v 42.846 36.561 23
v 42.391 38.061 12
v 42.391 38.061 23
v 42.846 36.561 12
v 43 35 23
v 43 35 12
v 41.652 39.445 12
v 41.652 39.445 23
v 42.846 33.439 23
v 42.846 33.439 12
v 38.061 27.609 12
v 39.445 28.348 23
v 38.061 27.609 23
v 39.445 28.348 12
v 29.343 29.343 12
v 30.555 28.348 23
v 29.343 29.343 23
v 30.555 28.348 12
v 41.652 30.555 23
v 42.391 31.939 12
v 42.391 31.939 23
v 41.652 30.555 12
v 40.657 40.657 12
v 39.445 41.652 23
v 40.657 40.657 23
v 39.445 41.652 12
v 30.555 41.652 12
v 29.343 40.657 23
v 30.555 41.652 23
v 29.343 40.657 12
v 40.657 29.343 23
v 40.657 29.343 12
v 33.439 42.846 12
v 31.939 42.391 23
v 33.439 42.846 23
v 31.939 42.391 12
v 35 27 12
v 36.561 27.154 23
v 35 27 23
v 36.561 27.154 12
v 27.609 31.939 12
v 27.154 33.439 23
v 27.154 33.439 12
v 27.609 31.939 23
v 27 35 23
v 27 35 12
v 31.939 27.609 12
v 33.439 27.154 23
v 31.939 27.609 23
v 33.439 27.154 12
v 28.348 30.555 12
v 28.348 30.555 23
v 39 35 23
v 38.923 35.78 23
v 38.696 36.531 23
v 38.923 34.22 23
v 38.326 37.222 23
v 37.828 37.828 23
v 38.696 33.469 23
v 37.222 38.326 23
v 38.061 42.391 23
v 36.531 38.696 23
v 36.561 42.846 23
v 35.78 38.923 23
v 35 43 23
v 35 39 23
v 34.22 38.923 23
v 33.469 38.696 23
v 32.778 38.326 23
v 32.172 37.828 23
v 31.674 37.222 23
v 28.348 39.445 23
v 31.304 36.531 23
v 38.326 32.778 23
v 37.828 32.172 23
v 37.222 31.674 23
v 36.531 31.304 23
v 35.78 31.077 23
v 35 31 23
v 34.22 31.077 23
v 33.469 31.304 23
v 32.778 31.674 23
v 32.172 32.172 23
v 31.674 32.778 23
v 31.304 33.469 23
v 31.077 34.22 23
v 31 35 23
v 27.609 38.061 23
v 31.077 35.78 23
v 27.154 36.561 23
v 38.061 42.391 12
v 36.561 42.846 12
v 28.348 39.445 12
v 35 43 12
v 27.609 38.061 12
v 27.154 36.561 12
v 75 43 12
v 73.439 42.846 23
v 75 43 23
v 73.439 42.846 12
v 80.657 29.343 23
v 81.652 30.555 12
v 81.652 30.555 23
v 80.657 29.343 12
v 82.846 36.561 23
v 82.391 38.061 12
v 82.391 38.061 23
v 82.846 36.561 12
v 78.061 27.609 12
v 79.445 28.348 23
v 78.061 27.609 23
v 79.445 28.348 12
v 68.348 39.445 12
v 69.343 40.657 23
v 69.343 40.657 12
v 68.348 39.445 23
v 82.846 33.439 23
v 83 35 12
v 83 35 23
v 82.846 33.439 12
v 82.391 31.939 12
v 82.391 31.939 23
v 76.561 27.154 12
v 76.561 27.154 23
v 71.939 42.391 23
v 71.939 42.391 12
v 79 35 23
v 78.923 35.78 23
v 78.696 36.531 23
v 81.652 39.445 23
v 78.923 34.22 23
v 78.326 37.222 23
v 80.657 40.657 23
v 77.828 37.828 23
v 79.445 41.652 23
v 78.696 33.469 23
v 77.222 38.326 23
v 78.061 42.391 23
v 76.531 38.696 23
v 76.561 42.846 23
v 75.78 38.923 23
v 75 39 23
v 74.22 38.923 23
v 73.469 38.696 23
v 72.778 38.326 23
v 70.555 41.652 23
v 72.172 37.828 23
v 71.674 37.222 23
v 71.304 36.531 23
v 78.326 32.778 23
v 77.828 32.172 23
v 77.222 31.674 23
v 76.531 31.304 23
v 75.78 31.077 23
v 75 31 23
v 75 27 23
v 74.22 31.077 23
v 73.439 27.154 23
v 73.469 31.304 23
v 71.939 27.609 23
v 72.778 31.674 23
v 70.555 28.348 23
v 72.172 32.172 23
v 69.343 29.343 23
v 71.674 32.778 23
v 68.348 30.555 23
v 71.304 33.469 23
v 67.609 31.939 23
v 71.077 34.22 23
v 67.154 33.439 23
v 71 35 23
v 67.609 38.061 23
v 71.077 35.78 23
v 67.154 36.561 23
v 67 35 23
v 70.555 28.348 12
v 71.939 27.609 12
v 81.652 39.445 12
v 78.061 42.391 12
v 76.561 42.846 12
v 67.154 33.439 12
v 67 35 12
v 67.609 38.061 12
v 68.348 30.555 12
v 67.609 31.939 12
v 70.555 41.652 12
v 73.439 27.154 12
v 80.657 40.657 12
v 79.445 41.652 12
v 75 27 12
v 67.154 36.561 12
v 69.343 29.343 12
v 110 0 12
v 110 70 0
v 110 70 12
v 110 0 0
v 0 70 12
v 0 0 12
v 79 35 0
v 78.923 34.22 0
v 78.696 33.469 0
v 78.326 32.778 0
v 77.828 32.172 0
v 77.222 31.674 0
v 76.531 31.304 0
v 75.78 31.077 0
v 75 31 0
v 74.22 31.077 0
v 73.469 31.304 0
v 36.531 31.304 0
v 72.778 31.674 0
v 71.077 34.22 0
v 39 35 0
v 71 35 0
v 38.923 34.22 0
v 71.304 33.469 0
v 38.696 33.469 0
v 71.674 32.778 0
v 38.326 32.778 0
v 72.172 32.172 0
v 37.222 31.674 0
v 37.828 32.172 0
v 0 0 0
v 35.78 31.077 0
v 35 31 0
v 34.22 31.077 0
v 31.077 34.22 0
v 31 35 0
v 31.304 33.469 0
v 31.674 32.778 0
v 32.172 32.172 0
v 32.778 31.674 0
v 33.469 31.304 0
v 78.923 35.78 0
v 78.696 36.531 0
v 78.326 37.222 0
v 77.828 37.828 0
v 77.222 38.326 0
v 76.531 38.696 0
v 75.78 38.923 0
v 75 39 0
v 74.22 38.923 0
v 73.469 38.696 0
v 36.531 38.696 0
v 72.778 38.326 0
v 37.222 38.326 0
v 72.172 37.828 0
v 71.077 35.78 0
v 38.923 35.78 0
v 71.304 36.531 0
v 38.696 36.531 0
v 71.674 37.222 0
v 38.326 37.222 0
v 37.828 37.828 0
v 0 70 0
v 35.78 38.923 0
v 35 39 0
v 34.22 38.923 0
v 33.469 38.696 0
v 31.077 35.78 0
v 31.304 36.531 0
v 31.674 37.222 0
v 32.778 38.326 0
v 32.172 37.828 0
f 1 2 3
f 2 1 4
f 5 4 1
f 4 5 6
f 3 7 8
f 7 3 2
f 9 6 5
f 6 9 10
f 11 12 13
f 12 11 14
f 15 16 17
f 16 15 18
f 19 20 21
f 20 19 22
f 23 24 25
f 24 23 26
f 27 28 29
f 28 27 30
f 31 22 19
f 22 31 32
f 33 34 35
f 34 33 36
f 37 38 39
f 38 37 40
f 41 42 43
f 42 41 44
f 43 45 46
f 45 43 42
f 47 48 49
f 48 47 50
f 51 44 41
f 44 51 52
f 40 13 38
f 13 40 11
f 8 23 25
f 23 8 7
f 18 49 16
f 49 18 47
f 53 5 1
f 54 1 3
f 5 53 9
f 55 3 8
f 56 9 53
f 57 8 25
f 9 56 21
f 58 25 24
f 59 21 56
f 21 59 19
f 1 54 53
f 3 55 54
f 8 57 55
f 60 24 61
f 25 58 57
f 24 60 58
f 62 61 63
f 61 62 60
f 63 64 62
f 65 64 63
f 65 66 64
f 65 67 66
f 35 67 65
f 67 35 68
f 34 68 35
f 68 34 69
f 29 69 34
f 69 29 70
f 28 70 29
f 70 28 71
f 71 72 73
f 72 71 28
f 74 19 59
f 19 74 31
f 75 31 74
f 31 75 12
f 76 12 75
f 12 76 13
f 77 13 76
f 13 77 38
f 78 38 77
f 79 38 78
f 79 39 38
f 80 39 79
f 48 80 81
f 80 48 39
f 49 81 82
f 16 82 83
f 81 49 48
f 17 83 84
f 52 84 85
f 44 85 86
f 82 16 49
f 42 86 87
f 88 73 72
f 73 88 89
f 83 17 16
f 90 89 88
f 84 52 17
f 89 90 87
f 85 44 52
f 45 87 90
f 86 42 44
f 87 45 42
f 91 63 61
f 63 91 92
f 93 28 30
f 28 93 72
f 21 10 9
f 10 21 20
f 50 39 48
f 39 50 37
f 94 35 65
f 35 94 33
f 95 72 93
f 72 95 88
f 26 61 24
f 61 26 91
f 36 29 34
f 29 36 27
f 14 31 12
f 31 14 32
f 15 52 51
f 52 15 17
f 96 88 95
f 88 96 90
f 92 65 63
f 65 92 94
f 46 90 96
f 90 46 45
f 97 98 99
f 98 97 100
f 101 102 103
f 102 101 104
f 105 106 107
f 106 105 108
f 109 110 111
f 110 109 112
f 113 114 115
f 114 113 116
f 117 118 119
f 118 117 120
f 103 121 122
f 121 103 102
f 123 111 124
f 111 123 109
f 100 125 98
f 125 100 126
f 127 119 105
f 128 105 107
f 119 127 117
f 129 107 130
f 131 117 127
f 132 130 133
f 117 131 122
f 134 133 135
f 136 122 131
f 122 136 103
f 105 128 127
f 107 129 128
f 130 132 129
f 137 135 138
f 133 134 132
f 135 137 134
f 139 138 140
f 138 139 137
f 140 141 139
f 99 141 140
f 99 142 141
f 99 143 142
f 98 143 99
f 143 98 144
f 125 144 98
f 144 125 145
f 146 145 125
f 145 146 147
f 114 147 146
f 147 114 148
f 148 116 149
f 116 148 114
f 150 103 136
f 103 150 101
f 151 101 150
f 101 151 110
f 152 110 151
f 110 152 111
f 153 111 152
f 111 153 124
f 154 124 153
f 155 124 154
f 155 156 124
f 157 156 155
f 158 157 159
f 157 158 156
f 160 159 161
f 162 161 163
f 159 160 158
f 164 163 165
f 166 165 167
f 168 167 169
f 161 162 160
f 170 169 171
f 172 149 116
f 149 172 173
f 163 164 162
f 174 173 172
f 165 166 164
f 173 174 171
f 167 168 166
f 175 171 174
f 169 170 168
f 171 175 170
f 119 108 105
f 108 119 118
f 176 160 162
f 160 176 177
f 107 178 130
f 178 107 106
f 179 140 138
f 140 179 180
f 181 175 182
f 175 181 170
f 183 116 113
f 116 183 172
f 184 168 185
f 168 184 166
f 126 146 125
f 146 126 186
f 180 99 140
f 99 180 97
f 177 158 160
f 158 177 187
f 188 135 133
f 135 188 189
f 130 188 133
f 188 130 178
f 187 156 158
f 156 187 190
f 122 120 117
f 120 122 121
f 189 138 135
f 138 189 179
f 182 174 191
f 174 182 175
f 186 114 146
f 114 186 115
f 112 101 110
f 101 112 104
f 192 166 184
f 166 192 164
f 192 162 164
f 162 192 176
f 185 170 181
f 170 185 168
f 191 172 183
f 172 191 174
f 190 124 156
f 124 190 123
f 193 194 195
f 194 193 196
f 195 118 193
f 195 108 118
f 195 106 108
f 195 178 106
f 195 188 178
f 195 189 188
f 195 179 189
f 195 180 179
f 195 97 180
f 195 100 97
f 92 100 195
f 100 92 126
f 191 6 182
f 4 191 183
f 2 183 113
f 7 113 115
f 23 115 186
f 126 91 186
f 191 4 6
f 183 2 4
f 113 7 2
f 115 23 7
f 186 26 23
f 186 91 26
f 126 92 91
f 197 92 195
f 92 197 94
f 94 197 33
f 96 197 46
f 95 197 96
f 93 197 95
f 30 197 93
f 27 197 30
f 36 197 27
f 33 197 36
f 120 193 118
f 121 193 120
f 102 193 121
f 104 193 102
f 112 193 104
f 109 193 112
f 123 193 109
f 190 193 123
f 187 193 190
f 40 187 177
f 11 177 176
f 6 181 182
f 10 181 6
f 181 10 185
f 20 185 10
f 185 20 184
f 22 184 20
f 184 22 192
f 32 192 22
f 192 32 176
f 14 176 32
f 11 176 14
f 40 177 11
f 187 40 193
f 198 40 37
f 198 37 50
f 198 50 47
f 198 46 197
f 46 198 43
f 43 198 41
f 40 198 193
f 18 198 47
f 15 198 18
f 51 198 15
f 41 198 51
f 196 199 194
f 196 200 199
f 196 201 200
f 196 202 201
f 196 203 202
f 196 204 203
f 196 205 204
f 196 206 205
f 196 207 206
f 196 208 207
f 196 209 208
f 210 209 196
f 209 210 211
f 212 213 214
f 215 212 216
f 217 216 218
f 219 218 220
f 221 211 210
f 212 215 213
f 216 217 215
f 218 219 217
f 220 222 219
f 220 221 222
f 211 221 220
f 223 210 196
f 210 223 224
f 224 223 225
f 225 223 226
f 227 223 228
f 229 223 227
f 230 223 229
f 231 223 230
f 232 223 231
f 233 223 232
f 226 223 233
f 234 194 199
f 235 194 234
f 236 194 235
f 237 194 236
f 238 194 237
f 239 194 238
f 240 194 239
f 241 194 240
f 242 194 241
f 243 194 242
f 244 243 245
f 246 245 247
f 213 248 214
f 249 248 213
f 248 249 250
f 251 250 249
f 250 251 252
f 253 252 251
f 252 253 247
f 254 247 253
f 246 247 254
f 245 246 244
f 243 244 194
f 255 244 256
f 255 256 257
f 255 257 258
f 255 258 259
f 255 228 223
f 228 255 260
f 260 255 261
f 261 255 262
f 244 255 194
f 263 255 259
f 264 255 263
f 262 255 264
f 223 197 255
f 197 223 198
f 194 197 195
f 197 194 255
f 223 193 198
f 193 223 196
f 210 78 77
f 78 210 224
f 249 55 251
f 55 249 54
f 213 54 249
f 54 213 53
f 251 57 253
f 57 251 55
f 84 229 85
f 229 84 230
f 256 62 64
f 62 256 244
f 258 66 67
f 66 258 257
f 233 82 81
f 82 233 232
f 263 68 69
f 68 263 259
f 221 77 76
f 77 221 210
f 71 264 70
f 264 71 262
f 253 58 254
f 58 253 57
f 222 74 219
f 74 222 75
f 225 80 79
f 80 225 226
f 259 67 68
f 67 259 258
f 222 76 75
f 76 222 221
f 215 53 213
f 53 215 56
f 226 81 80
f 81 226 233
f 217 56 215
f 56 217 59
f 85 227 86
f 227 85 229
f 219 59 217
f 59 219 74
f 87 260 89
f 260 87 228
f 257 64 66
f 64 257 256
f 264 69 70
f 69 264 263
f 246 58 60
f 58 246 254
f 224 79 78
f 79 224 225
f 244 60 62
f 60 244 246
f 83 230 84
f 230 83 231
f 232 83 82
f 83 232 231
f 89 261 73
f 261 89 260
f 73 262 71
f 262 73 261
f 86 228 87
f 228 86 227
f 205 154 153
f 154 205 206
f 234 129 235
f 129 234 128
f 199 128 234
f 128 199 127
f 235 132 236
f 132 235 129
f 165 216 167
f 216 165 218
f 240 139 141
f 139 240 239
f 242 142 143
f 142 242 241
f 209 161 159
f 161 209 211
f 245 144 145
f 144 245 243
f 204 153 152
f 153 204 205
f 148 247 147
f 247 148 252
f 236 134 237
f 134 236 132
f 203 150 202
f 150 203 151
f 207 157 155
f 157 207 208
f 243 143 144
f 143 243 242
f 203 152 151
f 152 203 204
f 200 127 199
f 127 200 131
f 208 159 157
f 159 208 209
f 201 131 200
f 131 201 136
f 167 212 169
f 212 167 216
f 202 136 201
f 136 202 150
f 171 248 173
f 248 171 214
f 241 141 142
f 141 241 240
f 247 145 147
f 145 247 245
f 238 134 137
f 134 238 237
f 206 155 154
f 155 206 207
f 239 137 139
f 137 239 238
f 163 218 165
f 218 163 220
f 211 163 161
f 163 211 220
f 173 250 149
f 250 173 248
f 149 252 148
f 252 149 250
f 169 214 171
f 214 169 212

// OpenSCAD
$fn = 32;

// ----------------------------------------------------------------------
// Drill jig: two_boss jig
// ----------------------------------------------------------------------

// --- parameters (mm) ---
plate_l = 110;            // plate length, X
plate_w = 70;             // plate width, Y
plate_t = 12;             // plate thickness
boss_d = 16;              // guide boss diameter
boss_h = 12;              // boss height above the plate
guide_d = 8;              // guide hole diameter
boss_pitch = 40;          // boss pitch
fit_tol = 0.05;           // tolerance for press fits, mm
free_tol = 0.2;           // tolerance for clearance fits, mm

n_boss = 2;  // guide bosses
boss_x0 = (plate_l - (n_boss - 1) * boss_pitch) / 2;  // first boss X
boss_top = plate_t - 1 + boss_h;  // boss crown height
total_h = boss_top;  // overall height

difference() {
  union() {
  cube([plate_l, plate_w, plate_t]);
  for (i = [0 : n_boss - 1])
    translate([boss_x0 + i * boss_pitch, plate_w / 2, plate_t - 1])
      cylinder(h = boss_h, d = boss_d);
  }
  for (i = [0 : n_boss - 1])
    translate([boss_x0 + i * boss_pitch, plate_w / 2, -1])
      cylinder(h = plate_t + boss_h, d = guide_d);
}
